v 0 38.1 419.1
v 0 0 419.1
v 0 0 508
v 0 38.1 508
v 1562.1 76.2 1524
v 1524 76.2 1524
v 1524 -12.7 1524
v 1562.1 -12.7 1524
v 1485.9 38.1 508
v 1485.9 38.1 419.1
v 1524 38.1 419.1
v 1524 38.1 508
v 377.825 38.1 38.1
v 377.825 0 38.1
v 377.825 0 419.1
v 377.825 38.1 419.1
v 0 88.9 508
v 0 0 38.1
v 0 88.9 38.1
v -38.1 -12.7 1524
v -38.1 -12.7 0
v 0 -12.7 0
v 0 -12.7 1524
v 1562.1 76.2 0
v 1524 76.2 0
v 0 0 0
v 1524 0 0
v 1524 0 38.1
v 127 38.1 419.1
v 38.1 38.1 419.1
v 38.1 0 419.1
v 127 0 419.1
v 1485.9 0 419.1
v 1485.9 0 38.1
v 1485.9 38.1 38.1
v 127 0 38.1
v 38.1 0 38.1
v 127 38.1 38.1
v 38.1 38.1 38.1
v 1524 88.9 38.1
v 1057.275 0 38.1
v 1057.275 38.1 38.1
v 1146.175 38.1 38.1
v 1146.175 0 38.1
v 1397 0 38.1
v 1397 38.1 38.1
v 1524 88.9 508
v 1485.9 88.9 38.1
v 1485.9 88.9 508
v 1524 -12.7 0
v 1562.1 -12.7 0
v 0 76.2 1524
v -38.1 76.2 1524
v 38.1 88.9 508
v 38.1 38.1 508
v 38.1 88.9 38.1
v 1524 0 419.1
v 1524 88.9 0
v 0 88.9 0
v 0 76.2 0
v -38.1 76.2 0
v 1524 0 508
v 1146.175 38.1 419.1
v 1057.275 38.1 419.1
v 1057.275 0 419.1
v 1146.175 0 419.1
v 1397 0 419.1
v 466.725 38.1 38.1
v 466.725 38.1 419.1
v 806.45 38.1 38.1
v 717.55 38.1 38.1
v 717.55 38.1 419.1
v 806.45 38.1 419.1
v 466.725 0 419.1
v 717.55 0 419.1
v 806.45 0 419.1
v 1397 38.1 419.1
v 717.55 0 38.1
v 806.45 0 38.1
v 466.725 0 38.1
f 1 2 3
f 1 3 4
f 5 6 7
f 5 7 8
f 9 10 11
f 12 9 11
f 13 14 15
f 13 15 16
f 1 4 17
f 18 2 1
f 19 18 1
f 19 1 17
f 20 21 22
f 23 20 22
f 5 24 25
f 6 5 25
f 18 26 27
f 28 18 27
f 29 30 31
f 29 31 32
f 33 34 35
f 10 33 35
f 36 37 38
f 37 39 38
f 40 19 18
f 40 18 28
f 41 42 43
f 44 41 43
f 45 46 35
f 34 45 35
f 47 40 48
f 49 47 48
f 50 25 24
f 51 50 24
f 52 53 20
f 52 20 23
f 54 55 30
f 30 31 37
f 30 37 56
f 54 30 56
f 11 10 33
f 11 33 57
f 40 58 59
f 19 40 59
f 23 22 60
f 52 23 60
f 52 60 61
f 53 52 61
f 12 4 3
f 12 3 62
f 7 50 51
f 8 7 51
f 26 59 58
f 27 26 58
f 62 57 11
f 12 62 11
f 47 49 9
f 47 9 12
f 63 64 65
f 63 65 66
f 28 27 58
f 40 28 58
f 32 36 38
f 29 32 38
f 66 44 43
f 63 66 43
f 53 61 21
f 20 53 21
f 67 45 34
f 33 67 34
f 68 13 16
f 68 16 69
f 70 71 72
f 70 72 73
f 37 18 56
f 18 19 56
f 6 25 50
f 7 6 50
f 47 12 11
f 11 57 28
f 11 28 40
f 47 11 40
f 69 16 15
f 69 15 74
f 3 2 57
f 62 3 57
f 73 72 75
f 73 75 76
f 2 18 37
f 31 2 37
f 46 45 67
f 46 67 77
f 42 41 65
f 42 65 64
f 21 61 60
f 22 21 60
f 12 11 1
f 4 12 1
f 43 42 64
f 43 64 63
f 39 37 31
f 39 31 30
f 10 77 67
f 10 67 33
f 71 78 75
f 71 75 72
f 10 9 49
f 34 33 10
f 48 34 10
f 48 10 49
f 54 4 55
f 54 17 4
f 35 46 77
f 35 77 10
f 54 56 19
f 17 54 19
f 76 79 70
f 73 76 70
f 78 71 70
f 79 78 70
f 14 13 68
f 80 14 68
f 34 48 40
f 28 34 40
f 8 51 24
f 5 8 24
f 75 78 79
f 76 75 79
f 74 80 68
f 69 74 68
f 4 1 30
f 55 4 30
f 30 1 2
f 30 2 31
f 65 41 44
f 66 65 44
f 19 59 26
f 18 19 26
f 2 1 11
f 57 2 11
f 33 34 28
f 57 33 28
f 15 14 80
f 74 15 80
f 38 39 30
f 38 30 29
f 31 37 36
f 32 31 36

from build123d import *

# Parameters (mm, degrees)
F1_DEPTH = 1524
F0_W     = 38.1
F0_H     = 38.1
F0_W_2   = 88.9
F0_W_3   = 250.825
F2_DEPTH = 508
F3_DEPTH = 419.1
F4_DEPTH = 508
F5_DEPTH = 419.1
F6_DEPTH = 419.1
F7_DEPTH = 38.1
F8_DEPTH = 38.1


# Not quite as in the source:
# - a feature names something its author has since deleted; it is built from what else it names


with BuildPart() as f1:
    # F0 (on Top) → F1 (new body)
    with BuildSketch(Plane.XY):
        Polygon((0, -12.7), (0, 0), (0, 38.1), (0, 76.2), (-38.1, 76.2), (-38.1, -12.7), align=None)
    extrude(amount=F1_DEPTH)


with BuildPart() as f1b:
    # F0 (on Top) → F1, piece 2 (new body)
    with BuildSketch(Plane.XY):
        Polygon((1562.1, 76.2), (1524, 76.2), (1524, 38.1), (1524, 0), (1524, -12.7), (1562.1, -12.7), align=None)
    extrude(amount=F1_DEPTH)


with BuildPart() as f2:
    # F0 (on Top) → F2 (new body)
    with BuildSketch(Plane.XY):
        with Locations((19.05, 19.05)):
            Rectangle(F0_W, F0_H)
        with Locations((82.55, 19.05)):
            Rectangle(F0_W_2, F0_H)
        with Locations((252.4125, 19.05)):
            Rectangle(F0_W_3, F0_H)
        with Locations((422.275, 19.05)):
            Rectangle(F0_W_2, F0_H)
        with Locations((592.1375, 19.05)):
            Rectangle(F0_W_3, F0_H)
        with Locations((762, 19.05)):
            Rectangle(F0_W_2, F0_H)
        with Locations((931.8625, 19.05)):
            Rectangle(F0_W_3, F0_H)
        with Locations((1101.725, 19.05)):
            Rectangle(F0_W_2, F0_H)
        with Locations((1271.5875, 19.05)):
            Rectangle(F0_W_3, F0_H)
        with Locations((1441.45, 19.05)):
            Rectangle(F0_W_2, F0_H)
        with Locations((1504.95, 19.05)):
            Rectangle(F0_W, F0_H)
    extrude(amount=F2_DEPTH)

    # F0 (on Top) → F3 (cut)
    with BuildSketch(Plane.XY):
        with Locations((19.05, 19.05)):
            Rectangle(F0_W, F0_H)
        with Locations((82.55, 19.05)):
            Rectangle(F0_W_2, F0_H)
        with Locations((252.4125, 19.05)):
            Rectangle(F0_W_3, F0_H)
        with Locations((422.275, 19.05)):
            Rectangle(F0_W_2, F0_H)
        with Locations((592.1375, 19.05)):
            Rectangle(F0_W_3, F0_H)
        with Locations((762, 19.05)):
            Rectangle(F0_W_2, F0_H)
        with Locations((931.8625, 19.05)):
            Rectangle(F0_W_3, F0_H)
        with Locations((1101.725, 19.05)):
            Rectangle(F0_W_2, F0_H)
        with Locations((1271.5875, 19.05)):
            Rectangle(F0_W_3, F0_H)
        with Locations((1441.45, 19.05)):
            Rectangle(F0_W_2, F0_H)
        with Locations((1504.95, 19.05)):
            Rectangle(F0_W, F0_H)
    extrude(amount=F3_DEPTH, mode=Mode.SUBTRACT)


with BuildPart() as f4:
    # F0 (on Top) → F4 (new body, through all)
    with BuildSketch(Plane.XY):
        Polygon((0, 76.2), (0, 38.1), (38.1, 38.1), (38.1, 88.9), (0, 88.9), align=None)
    extrude(amount=F4_DEPTH)

    # F0 (on Top) → F5 (join, through all)
    with BuildSketch(Plane.XY):
        with Locations((19.05, 19.05)):
            Rectangle(F0_W, F0_H)
    extrude(amount=F5_DEPTH)


with BuildPart() as f4b:
    # F0 (on Top) → F4, piece 2 (new body, through all)
    with BuildSketch(Plane.XY):
        Polygon((1524, 88.9), (1485.9, 88.9), (1485.9, 38.1), (1524, 38.1), (1524, 76.2), align=None)
    extrude(amount=F4_DEPTH)

    # F0 (on Top) → F5, piece 2 (join, through all)
    with BuildSketch(Plane.XY):
        with Locations((1504.95, 19.05)):
            Rectangle(F0_W, F0_H)
    extrude(amount=F5_DEPTH)


with BuildPart() as f6:
    # F0 (on Top) → F6 (new body, through all)
    with BuildSketch(Plane.XY):
        with Locations((82.55, 19.05)):
            Rectangle(F0_W_2, F0_H)
    extrude(amount=F6_DEPTH)


with BuildPart() as f6b:
    # F0 (on Top) → F6, piece 2 (new body, through all)
    with BuildSketch(Plane.XY):
        with Locations((422.275, 19.05)):
            Rectangle(F0_W_2, F0_H)
    extrude(amount=F6_DEPTH)


with BuildPart() as f6c:
    # F0 (on Top) → F6, piece 3 (new body, through all)
    with BuildSketch(Plane.XY):
        with Locations((762, 19.05)):
            Rectangle(F0_W_2, F0_H)
    extrude(amount=F6_DEPTH)


with BuildPart() as f6d:
    # F0 (on Top) → F6, piece 4 (new body, through all)
    with BuildSketch(Plane.XY):
        with Locations((1101.725, 19.05)):
            Rectangle(F0_W_2, F0_H)
    extrude(amount=F6_DEPTH)


with BuildPart() as f6e:
    # F0 (on Top) → F6, piece 5 (new body, through all)
    with BuildSketch(Plane.XY):
        with Locations((1441.45, 19.05)):
            Rectangle(F0_W_2, F0_H)
    extrude(amount=F6_DEPTH)


with BuildPart() as f7_tool:
    # F0 (on Top) → F7 (new body)
    with BuildSketch(Plane.XY):
        Polygon((1524, 88.9), (1485.9, 88.9), (1485.9, 38.1), (1524, 38.1), (1524, 76.2), align=None)
        with Locations((1504.95, 19.05)):
            Rectangle(F0_W, F0_H)
        with Locations((1441.45, 19.05)):
            Rectangle(F0_W_2, F0_H)
        with Locations((1101.725, 19.05)):
            Rectangle(F0_W_2, F0_H)
        with Locations((762, 19.05)):
            Rectangle(F0_W_2, F0_H)
        with Locations((422.275, 19.05)):
            Rectangle(F0_W_2, F0_H)
        with Locations((82.55, 19.05)):
            Rectangle(F0_W_2, F0_H)
        with Locations((19.05, 19.05)):
            Rectangle(F0_W, F0_H)
        Polygon((0, 76.2), (0, 38.1), (38.1, 38.1), (38.1, 88.9), (0, 88.9), align=None)
    extrude(amount=F7_DEPTH)


with BuildPart() as f4_1:
    add(f4.part)

    # F7: cut by f7_tool
    add(f7_tool.part, mode=Mode.SUBTRACT)


with BuildPart() as f4b_1:
    add(f4b.part)

    # F7: cut by f7_tool
    add(f7_tool.part, mode=Mode.SUBTRACT)


with BuildPart() as f6_1:
    add(f6.part)

    # F7: cut by f7_tool
    add(f7_tool.part, mode=Mode.SUBTRACT)


with BuildPart() as f6b_1:
    add(f6b.part)

    # F7: cut by f7_tool
    add(f7_tool.part, mode=Mode.SUBTRACT)


with BuildPart() as f6c_1:
    add(f6c.part)

    # F7: cut by f7_tool
    add(f7_tool.part, mode=Mode.SUBTRACT)


with BuildPart() as f6d_1:
    add(f6d.part)

    # F7: cut by f7_tool
    add(f7_tool.part, mode=Mode.SUBTRACT)


with BuildPart() as f6e_1:
    add(f6e.part)

    # F7: cut by f7_tool
    add(f7_tool.part, mode=Mode.SUBTRACT)


with BuildPart() as f8:
    # F0 (on Top) → F8 (new body)
    with BuildSketch(Plane.XY):
        Polygon((1524, 88.9), (1485.9, 88.9), (1485.9, 38.1), (1524, 38.1), (1524, 76.2), align=None)
        with Locations((1504.95, 19.05)):
            Rectangle(F0_W, F0_H)
        with Locations((1441.45, 19.05)):
            Rectangle(F0_W_2, F0_H)
        Polygon((38.1, 88.9), (38.1, 38.1), (127, 38.1), (377.825, 38.1), (466.725, 38.1), (717.55, 38.1), (806.45, 38.1), (1057.275, 38.1), (1146.175, 38.1), (1397, 38.1), (1485.9, 38.1), (1485.9, 88.9), align=None)
        with Locations((1271.5875, 19.05)):
            Rectangle(F0_W_3, F0_H)
        with Locations((1101.725, 19.05)):
            Rectangle(F0_W_2, F0_H)
        with Locations((931.8625, 19.05)):
            Rectangle(F0_W_3, F0_H)
        with Locations((762, 19.05)):
            Rectangle(F0_W_2, F0_H)
        with Locations((592.1375, 19.05)):
            Rectangle(F0_W_3, F0_H)
        with Locations((422.275, 19.05)):
            Rectangle(F0_W_2, F0_H)
        with Locations((252.4125, 19.05)):
            Rectangle(F0_W_3, F0_H)
        with Locations((82.55, 19.05)):
            Rectangle(F0_W_2, F0_H)
        Polygon((0, 76.2), (0, 38.1), (38.1, 38.1), (38.1, 88.9), (0, 88.9), align=None)
        with Locations((19.05, 19.05)):
            Rectangle(F0_W, F0_H)
    extrude(amount=F8_DEPTH)


solid = Compound([f1.part, f1b.part, f2.part, f4_1.part, f4b_1.part, f6_1.part, f6b_1.part, f6c_1.part, f6d_1.part, f6e_1.part, f8.part])
